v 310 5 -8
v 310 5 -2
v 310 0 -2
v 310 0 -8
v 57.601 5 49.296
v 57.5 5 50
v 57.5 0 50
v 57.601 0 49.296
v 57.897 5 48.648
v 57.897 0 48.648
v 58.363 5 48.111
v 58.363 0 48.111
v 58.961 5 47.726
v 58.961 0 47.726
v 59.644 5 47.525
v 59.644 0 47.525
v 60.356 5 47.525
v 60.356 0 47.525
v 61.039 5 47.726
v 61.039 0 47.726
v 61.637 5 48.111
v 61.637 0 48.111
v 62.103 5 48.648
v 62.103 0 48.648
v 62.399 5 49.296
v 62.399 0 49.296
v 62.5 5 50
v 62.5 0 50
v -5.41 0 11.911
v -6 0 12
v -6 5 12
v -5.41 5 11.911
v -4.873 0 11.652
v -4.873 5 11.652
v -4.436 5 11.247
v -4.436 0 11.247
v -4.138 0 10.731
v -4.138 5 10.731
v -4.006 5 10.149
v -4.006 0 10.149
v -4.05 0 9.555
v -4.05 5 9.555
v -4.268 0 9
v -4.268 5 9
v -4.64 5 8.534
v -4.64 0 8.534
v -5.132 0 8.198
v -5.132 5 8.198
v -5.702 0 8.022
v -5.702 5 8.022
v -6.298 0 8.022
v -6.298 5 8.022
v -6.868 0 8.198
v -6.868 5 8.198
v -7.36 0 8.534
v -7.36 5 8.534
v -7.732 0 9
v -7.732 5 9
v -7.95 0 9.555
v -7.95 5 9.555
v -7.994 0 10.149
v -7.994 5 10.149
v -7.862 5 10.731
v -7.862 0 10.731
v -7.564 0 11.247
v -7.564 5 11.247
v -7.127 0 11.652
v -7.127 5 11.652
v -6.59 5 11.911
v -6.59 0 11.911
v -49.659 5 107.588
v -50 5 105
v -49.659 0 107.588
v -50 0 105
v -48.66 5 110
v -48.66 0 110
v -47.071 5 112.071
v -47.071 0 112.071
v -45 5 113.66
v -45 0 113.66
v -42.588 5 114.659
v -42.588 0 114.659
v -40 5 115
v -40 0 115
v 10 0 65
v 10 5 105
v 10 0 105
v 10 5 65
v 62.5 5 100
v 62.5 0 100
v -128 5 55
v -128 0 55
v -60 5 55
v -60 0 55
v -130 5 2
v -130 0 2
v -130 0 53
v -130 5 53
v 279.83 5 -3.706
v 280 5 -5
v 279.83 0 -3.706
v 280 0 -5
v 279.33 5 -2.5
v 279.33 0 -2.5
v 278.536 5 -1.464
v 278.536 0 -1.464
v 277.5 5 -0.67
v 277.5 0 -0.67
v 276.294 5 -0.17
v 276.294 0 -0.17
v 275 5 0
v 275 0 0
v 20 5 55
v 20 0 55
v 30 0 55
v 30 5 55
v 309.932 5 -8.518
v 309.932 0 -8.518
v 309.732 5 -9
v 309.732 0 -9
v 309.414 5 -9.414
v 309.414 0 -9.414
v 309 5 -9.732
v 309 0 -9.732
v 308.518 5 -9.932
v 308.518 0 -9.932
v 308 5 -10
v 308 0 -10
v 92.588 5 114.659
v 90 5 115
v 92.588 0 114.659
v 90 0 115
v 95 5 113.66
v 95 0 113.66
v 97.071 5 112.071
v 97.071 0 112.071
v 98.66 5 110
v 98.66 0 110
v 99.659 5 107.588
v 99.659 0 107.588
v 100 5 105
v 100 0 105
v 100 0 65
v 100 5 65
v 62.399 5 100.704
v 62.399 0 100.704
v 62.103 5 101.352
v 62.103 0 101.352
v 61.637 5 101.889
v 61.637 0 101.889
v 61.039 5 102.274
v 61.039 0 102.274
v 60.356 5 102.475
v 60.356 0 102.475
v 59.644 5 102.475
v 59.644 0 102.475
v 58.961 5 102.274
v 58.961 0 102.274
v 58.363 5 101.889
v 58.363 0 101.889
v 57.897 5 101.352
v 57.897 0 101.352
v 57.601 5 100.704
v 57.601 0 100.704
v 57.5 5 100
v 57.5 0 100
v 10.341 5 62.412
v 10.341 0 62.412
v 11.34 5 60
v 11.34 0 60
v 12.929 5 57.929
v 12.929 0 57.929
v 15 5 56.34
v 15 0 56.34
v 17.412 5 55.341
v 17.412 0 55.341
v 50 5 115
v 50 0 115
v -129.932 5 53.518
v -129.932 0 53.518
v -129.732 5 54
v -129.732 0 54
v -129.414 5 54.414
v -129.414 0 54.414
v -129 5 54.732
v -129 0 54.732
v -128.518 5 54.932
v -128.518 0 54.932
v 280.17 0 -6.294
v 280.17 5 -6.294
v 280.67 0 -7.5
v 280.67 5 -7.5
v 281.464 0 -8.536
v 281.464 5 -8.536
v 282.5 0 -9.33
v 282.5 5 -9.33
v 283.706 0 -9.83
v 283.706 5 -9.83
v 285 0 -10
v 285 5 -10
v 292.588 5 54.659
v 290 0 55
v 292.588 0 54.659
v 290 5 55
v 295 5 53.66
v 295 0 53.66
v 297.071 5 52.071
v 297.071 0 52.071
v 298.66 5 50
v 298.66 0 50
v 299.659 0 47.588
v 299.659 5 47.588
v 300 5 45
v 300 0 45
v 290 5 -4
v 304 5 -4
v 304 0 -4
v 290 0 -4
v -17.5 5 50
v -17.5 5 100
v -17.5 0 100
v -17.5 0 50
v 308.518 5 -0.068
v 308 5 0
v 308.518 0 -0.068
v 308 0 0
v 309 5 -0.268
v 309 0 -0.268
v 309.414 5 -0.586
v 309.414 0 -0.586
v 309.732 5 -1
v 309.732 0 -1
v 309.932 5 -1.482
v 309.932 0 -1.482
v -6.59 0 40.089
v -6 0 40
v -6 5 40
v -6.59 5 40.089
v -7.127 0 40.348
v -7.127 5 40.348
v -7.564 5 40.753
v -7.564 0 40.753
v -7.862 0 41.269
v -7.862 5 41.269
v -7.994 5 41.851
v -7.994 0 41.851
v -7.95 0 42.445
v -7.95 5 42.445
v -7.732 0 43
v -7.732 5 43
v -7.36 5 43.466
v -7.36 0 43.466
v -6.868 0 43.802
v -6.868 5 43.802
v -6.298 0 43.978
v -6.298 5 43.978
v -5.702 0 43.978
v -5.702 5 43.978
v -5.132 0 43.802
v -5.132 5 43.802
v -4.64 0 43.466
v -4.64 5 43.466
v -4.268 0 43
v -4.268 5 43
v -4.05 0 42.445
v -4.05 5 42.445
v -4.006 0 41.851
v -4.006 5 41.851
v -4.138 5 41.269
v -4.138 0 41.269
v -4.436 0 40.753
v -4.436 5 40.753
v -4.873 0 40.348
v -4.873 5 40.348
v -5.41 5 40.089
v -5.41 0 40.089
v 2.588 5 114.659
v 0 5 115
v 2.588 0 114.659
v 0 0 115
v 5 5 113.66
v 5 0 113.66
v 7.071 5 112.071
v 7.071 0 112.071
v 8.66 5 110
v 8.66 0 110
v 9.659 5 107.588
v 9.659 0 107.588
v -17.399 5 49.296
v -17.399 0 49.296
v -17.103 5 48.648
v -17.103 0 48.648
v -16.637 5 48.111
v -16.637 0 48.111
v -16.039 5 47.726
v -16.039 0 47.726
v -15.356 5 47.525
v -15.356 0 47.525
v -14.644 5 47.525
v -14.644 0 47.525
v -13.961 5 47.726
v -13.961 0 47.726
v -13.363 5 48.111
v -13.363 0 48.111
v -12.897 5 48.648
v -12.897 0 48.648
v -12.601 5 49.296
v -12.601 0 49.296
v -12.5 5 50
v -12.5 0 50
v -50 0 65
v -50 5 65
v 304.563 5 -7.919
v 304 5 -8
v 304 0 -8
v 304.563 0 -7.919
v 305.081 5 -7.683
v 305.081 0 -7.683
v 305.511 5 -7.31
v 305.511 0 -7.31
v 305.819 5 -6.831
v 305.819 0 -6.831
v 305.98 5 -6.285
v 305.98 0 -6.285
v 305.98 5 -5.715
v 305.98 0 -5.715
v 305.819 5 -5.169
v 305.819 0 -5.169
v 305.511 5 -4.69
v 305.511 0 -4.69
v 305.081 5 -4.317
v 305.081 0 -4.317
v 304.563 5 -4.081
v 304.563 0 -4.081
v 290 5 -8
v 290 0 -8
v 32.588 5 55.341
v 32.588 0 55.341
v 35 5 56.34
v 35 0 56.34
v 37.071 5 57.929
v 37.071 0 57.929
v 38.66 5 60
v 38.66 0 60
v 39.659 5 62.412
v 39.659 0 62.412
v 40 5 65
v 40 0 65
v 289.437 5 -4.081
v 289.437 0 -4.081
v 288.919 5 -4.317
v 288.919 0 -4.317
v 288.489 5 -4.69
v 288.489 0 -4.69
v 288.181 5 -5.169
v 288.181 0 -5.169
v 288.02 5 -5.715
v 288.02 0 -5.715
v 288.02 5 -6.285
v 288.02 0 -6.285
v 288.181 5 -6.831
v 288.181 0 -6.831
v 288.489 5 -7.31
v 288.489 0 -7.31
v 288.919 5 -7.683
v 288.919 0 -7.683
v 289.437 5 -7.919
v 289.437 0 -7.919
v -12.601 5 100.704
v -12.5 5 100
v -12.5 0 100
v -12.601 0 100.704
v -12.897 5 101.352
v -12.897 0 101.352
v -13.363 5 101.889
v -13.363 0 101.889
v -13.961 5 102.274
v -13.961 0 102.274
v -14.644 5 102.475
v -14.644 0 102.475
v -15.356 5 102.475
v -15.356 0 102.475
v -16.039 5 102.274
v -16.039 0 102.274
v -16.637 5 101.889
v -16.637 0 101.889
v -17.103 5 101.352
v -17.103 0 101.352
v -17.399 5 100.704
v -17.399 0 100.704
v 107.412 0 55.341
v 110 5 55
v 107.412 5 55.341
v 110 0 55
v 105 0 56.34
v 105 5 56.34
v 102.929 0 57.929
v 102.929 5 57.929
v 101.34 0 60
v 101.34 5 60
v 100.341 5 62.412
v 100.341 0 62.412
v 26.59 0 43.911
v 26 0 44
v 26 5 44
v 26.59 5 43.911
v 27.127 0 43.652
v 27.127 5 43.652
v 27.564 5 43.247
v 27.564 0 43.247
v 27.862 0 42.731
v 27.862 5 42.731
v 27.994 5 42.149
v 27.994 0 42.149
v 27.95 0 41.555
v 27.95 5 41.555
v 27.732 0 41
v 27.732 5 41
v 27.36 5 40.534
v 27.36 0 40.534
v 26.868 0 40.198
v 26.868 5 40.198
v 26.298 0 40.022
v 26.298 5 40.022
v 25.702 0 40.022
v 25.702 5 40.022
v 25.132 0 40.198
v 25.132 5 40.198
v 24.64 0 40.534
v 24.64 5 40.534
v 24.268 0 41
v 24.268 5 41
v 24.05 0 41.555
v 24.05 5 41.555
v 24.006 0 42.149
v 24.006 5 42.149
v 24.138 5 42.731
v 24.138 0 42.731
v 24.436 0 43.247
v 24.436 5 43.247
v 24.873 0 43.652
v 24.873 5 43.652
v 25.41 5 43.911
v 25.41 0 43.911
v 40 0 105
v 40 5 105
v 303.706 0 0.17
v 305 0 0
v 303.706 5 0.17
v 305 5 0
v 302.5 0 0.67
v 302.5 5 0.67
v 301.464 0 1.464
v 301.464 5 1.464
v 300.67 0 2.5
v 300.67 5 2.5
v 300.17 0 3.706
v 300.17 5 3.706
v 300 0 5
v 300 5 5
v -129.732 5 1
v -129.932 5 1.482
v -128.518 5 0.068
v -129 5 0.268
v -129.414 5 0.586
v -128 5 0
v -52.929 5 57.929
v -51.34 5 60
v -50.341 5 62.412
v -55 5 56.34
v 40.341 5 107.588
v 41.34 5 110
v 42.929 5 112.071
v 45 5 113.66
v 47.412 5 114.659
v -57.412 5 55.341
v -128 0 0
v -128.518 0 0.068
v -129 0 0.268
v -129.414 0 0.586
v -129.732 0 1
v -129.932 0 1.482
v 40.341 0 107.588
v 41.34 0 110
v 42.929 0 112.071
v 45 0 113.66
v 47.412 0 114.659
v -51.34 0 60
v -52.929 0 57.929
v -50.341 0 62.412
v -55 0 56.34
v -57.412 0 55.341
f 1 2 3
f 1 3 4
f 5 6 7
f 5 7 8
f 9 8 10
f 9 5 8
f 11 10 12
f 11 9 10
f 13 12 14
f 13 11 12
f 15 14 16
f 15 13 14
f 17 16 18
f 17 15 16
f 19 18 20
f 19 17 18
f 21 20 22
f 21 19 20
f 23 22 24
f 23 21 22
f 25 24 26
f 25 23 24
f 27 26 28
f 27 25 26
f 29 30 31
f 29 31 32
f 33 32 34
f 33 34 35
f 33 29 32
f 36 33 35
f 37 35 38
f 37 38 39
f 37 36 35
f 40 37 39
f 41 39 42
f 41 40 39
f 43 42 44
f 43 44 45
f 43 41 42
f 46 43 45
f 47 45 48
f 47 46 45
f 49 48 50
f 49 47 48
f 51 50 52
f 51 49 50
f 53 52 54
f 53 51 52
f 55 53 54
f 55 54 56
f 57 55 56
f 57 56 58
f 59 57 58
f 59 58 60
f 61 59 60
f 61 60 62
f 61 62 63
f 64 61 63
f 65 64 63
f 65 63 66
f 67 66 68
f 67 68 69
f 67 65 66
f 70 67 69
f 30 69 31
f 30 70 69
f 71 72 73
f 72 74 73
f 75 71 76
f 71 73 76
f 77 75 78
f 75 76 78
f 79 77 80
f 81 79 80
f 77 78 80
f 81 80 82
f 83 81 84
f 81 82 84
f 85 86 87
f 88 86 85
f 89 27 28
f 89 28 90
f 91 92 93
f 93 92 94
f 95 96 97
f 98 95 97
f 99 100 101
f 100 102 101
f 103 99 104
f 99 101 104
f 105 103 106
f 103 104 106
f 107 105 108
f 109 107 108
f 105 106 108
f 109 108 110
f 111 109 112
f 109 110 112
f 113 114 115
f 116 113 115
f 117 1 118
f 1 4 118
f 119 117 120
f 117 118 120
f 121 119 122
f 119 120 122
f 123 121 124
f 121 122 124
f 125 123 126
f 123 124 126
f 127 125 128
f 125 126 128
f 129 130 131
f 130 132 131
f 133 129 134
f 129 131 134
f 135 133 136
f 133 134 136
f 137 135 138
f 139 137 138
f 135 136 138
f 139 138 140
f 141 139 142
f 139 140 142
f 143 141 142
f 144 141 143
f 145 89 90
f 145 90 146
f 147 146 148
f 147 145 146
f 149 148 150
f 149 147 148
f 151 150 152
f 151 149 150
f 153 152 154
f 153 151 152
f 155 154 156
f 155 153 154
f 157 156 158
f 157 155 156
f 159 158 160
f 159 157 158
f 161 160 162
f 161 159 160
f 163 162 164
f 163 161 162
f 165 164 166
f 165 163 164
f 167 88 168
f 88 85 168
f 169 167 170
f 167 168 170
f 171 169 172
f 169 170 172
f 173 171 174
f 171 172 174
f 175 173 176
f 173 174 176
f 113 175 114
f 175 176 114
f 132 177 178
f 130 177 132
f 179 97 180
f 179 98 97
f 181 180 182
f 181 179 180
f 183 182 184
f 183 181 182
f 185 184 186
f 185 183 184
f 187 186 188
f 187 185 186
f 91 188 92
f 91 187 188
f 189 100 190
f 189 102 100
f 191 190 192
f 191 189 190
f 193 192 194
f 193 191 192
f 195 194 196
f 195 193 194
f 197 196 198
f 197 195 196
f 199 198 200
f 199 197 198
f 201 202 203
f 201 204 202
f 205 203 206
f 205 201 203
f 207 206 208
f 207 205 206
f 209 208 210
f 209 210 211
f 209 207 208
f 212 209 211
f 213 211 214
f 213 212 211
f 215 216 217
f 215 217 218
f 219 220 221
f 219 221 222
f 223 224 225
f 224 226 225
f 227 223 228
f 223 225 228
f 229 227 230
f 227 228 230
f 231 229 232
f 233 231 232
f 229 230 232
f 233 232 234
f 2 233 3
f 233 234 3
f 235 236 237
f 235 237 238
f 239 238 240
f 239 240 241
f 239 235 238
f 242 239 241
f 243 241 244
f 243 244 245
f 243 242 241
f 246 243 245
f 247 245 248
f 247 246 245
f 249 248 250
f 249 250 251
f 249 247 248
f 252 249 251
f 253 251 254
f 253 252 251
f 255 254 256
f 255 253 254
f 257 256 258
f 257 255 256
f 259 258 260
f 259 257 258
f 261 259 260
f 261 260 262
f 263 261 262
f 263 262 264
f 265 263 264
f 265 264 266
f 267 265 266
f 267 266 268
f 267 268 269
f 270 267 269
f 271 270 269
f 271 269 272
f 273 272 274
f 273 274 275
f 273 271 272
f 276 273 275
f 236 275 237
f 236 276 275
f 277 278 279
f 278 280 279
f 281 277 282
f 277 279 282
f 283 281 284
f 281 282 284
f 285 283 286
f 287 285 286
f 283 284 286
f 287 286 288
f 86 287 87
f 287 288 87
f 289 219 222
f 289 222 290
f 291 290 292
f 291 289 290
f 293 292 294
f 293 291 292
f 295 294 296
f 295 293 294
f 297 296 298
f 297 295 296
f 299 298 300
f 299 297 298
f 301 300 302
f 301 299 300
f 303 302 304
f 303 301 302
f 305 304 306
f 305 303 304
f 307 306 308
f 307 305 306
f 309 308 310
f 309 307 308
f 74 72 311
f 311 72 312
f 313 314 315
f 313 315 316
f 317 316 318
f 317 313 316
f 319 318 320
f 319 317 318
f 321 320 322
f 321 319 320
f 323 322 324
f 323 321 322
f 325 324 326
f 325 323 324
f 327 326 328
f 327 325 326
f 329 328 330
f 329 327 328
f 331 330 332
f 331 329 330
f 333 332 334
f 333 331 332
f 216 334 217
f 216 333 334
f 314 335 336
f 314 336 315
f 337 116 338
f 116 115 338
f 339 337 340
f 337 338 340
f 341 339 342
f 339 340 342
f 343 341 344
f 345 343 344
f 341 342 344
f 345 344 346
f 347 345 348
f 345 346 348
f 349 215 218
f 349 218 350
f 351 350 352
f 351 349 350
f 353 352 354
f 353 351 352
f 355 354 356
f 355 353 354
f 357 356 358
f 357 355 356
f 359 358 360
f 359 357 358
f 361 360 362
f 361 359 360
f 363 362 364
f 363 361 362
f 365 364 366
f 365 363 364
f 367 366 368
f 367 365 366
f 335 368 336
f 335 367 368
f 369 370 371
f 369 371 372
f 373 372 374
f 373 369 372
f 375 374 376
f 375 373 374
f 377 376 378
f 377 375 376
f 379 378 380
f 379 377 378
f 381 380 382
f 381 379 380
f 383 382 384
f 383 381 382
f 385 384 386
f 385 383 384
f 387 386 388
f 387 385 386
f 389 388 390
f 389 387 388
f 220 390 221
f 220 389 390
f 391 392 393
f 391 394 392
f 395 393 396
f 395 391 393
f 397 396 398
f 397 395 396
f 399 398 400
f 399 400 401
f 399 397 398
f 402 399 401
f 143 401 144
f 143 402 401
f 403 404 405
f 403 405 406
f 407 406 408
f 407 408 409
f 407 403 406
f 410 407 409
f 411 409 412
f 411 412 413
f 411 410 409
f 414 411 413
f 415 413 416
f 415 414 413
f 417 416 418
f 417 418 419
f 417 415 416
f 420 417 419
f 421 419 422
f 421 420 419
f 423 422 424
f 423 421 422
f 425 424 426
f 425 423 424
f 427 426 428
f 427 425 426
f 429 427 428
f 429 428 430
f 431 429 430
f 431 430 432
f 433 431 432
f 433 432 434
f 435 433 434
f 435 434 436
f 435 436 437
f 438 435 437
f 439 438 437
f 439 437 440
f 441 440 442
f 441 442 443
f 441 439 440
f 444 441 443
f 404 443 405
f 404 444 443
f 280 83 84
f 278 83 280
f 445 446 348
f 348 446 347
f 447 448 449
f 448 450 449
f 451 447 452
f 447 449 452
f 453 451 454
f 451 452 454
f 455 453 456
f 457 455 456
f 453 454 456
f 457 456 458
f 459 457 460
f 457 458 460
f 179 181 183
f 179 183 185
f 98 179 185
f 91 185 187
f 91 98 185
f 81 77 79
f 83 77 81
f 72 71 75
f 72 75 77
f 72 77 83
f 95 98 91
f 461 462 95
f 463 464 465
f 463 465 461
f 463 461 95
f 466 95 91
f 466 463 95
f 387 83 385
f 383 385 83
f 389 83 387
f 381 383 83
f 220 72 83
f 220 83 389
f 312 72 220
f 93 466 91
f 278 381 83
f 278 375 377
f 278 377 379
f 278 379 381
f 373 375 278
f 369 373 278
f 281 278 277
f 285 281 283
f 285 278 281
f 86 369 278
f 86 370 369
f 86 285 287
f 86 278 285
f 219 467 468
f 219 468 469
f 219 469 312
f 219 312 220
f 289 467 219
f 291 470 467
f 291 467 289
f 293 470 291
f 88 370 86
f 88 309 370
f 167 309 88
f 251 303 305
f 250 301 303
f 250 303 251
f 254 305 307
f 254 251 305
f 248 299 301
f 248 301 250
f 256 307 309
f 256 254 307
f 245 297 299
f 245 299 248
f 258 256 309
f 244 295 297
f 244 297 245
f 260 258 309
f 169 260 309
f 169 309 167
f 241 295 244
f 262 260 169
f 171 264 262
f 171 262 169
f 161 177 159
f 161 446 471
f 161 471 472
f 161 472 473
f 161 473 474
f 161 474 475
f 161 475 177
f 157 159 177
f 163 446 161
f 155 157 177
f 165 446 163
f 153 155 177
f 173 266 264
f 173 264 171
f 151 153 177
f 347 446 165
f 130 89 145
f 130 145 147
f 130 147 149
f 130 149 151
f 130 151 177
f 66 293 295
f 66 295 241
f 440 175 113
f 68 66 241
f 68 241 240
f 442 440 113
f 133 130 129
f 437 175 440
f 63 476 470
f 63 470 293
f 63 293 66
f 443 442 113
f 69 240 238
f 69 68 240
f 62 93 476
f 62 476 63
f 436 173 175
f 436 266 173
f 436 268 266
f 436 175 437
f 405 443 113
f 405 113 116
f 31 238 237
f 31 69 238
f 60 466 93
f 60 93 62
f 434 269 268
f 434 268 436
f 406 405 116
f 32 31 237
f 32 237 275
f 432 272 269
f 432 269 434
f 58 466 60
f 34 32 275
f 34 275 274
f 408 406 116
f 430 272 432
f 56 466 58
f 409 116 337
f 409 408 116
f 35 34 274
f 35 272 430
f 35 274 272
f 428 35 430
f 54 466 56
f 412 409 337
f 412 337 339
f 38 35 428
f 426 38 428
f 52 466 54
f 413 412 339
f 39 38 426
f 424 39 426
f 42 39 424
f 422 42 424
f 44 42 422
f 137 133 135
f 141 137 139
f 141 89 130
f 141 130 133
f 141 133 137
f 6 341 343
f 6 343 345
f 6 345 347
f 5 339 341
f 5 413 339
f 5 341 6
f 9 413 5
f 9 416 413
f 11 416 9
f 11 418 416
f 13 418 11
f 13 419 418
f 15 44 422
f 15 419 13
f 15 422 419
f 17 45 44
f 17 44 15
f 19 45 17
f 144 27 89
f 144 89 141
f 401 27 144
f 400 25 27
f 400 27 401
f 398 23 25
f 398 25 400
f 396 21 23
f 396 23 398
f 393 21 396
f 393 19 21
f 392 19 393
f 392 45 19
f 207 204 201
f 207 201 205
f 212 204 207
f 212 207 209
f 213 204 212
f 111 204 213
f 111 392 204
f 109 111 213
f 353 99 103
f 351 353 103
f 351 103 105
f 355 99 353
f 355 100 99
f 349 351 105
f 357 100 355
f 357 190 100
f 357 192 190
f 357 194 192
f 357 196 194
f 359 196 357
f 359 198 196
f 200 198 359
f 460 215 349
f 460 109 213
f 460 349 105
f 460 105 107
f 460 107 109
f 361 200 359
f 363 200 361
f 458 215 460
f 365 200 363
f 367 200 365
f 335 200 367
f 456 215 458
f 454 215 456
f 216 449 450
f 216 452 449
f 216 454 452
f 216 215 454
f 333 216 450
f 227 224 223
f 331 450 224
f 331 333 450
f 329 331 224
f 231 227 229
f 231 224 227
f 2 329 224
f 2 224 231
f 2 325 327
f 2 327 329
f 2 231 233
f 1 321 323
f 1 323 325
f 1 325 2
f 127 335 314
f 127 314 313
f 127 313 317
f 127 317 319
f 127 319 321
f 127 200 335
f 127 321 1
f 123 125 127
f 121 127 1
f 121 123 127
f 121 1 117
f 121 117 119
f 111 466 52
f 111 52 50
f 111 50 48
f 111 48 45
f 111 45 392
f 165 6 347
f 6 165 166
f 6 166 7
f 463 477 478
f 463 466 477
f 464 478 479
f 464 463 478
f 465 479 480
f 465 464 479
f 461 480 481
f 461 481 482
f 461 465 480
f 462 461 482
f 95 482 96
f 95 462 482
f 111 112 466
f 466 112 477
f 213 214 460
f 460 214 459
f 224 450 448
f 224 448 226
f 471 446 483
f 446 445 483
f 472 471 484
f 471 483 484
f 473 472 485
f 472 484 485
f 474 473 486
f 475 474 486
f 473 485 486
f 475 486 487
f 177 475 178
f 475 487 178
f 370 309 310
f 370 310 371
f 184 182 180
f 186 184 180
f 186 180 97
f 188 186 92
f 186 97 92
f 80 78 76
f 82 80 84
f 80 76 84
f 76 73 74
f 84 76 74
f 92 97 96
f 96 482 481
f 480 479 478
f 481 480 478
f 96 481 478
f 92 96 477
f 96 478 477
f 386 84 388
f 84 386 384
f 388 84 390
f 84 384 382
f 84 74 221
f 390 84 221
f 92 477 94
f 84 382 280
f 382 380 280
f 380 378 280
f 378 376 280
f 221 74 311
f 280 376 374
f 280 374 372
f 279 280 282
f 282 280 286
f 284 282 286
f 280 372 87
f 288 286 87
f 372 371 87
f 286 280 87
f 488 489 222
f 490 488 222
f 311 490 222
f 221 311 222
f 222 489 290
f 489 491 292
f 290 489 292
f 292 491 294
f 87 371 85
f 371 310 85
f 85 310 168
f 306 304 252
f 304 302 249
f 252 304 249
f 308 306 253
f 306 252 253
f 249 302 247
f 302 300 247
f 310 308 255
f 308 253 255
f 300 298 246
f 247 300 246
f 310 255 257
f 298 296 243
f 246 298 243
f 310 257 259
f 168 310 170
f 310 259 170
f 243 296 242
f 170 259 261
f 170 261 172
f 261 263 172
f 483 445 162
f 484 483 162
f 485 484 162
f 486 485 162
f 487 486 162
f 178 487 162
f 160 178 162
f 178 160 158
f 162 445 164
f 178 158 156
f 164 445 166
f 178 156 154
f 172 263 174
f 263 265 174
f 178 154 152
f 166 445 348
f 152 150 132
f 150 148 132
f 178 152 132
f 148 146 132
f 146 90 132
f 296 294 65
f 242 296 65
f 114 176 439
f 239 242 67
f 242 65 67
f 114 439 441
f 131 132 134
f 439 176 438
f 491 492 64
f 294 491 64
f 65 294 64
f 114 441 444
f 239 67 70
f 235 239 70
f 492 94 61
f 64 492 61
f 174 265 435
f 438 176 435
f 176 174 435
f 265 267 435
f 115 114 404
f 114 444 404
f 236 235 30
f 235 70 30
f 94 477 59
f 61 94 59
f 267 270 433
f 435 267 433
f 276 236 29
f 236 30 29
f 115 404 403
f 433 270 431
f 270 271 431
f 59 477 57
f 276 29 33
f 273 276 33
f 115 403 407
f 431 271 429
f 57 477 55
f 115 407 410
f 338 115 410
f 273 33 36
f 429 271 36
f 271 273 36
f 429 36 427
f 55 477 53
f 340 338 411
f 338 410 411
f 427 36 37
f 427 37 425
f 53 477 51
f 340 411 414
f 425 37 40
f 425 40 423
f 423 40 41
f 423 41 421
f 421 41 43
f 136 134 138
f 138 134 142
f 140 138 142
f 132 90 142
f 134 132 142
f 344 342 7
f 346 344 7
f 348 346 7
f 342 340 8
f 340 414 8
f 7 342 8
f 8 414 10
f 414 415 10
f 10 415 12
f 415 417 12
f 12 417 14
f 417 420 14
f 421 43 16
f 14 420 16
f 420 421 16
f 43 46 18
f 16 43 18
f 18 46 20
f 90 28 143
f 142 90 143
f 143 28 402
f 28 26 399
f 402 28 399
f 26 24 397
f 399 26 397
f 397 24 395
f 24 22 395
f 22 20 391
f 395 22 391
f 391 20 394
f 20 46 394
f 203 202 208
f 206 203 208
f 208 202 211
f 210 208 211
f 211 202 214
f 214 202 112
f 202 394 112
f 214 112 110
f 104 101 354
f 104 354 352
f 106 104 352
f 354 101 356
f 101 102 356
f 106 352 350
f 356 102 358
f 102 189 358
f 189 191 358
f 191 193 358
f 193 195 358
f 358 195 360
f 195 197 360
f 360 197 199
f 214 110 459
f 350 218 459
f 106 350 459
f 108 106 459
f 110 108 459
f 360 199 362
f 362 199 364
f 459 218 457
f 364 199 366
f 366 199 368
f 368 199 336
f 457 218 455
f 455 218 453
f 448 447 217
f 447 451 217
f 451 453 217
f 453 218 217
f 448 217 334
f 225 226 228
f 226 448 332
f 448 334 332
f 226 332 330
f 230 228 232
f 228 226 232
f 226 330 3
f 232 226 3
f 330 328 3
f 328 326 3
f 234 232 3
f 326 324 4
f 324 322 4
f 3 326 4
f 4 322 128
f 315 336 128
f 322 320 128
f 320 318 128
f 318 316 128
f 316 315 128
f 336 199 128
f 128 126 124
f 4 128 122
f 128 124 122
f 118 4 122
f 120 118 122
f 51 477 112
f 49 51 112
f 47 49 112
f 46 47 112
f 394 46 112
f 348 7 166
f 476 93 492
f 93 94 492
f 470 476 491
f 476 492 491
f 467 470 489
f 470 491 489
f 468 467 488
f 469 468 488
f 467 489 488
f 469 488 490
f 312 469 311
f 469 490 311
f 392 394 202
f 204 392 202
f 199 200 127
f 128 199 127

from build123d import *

# Parameters (mm, degrees)
SKETCH1_R           = 2
BOSS_EXTRUDE1_DEPTH = 5
SKETCH2_W           = 30
SKETCH2_H           = 10
BOSS_EXTRUDE2_DEPTH = 5
CUT_EXTRUDE1_DEPTH  = 315.880929877
FILLET1_R           = 5
SKETCH4_W           = 60
SKETCH4_H           = 60
BOSS_EXTRUDE3_DEPTH = 5
FILLET2_R           = 10
FILLET3_R           = 10
FILLET4_R           = 2
FILLET5_R           = 2
FILLET6_R           = 10
CUT_EXTRUDE2_DEPTH  = 331.681115276


with BuildPart() as part:
    # Sketch1 → Boss-Extrude1 (new body)
    with BuildSketch(Plane(origin=(0, 0, 0), x_dir=(1, 0, 0), z_dir=(0, 1, 0))):
        Polygon((0, 0), (-130, 0), (-130, -55), (300, -55), (300, 0), align=None)
        with Locations(Location((-6, -10, 0), (0, 0, 270))):
            Circle(SKETCH1_R, mode=Mode.SUBTRACT)
        with Locations(Location((-6, -42, 0), (0, 0, 90))):
            Circle(SKETCH1_R, mode=Mode.SUBTRACT)
        with Locations(Location((26, -42, 0), (0, 0, 270))):
            Circle(SKETCH1_R, mode=Mode.SUBTRACT)
    extrude(amount=BOSS_EXTRUDE1_DEPTH)

    # Sketch2 → Boss-Extrude2 (add)
    with BuildSketch(Plane(origin=(0, 5, 0), x_dir=(1, 0, 0), z_dir=(0, 1, 0))):
        with Locations((295, 5)):
            Rectangle(SKETCH2_W, SKETCH2_H)
    extrude(amount=-BOSS_EXTRUDE2_DEPTH)

    # Sketch3 → Cut-Extrude1 (cut, through all)
    with BuildSketch(Plane(origin=(0, 5, 0), x_dir=(1, 0, 0), z_dir=(0, 1, 0))):
        with BuildLine():
            Line((290, 8), (304, 8))
            ThreePointArc((304, 8), (306, 6), (304, 4))
            Line((304, 4), (290, 4))
            ThreePointArc((290, 4), (288, 6), (290, 8))
        make_face()
    extrude(amount=-CUT_EXTRUDE1_DEPTH, mode=Mode.SUBTRACT)

    # Fillet1
    fillet1_edges = [part.edges().sort_by_distance(p)[0] for p in [
        (300, 2.5, 0),
        (280, 2.5, -10),
        (280, 2.5, 0),
    ]]
    fillet(fillet1_edges, radius=FILLET1_R - 0.0001)  # a hair under: the kernel refuses the full size

    # Sketch4 → Boss-Extrude3 (add)
    with BuildSketch(Plane(origin=(0, 5, 0), x_dir=(1, 0, 0), z_dir=(0, 1, 0))):
        with Locations((70, -85)):
            Rectangle(SKETCH4_W, SKETCH4_H)
        with Locations((-20, -85)):
            Rectangle(SKETCH4_W, SKETCH4_H)
    extrude(amount=-BOSS_EXTRUDE3_DEPTH)

    # Fillet2
    fillet2_edges = [part.edges().sort_by_distance(p)[0] for p in [
        (40, 2.5, 55),
        (100, 2.5, 55),
        (100, 2.5, 115),
        (40, 2.5, 115),
    ]]
    fillet(fillet2_edges, radius=FILLET2_R)

    # Fillet3
    fillet3_edges = [part.edges().sort_by_distance(p)[0] for p in [
        (300, 2.5, 55),
    ]]
    fillet(fillet3_edges, radius=FILLET3_R)

    # Fillet4
    fillet4_edges = [part.edges().sort_by_distance(p)[0] for p in [
        (310, 2.5, -10),
        (310, 2.5, 0),
    ]]
    fillet(fillet4_edges, radius=FILLET4_R)

    # Fillet5
    fillet5_edges = [part.edges().sort_by_distance(p)[0] for p in [
        (-130, 2.5, 55),
        (-130, 2.5, 0),
    ]]
    fillet(fillet5_edges, radius=FILLET5_R)

    # Fillet6
    fillet6_edges = [part.edges().sort_by_distance(p)[0] for p in [
        (10, 2.5, 55),
        (10, 2.5, 115),
        (-50, 2.5, 115),
        (-50, 2.5, 55),
    ]]
    fillet(fillet6_edges, radius=FILLET6_R)

    # Sketch6 → Cut-Extrude2 (cut, through all)
    with BuildSketch(Plane(origin=(0, 5, 0), x_dir=(1, 0, 0), z_dir=(0, 1, 0))):
        with BuildLine():
            Line((-17.5, -100), (-17.5, -50))
            ThreePointArc((-17.5, -50), (-15, -47.5), (-12.5, -50))
            Line((-12.5, -50), (-12.5, -100))
            ThreePointArc((-12.5, -100), (-15, -102.5), (-17.5, -100))
        make_face()
        with BuildLine():
            Line((57.5, -100), (57.5, -50))
            ThreePointArc((57.5, -50), (60, -47.5), (62.5, -50))
            Line((62.5, -50), (62.5, -100))
            ThreePointArc((62.5, -100), (60, -102.5), (57.5, -100))
        make_face()
    extrude(amount=-CUT_EXTRUDE2_DEPTH, mode=Mode.SUBTRACT)


solid = part.part
